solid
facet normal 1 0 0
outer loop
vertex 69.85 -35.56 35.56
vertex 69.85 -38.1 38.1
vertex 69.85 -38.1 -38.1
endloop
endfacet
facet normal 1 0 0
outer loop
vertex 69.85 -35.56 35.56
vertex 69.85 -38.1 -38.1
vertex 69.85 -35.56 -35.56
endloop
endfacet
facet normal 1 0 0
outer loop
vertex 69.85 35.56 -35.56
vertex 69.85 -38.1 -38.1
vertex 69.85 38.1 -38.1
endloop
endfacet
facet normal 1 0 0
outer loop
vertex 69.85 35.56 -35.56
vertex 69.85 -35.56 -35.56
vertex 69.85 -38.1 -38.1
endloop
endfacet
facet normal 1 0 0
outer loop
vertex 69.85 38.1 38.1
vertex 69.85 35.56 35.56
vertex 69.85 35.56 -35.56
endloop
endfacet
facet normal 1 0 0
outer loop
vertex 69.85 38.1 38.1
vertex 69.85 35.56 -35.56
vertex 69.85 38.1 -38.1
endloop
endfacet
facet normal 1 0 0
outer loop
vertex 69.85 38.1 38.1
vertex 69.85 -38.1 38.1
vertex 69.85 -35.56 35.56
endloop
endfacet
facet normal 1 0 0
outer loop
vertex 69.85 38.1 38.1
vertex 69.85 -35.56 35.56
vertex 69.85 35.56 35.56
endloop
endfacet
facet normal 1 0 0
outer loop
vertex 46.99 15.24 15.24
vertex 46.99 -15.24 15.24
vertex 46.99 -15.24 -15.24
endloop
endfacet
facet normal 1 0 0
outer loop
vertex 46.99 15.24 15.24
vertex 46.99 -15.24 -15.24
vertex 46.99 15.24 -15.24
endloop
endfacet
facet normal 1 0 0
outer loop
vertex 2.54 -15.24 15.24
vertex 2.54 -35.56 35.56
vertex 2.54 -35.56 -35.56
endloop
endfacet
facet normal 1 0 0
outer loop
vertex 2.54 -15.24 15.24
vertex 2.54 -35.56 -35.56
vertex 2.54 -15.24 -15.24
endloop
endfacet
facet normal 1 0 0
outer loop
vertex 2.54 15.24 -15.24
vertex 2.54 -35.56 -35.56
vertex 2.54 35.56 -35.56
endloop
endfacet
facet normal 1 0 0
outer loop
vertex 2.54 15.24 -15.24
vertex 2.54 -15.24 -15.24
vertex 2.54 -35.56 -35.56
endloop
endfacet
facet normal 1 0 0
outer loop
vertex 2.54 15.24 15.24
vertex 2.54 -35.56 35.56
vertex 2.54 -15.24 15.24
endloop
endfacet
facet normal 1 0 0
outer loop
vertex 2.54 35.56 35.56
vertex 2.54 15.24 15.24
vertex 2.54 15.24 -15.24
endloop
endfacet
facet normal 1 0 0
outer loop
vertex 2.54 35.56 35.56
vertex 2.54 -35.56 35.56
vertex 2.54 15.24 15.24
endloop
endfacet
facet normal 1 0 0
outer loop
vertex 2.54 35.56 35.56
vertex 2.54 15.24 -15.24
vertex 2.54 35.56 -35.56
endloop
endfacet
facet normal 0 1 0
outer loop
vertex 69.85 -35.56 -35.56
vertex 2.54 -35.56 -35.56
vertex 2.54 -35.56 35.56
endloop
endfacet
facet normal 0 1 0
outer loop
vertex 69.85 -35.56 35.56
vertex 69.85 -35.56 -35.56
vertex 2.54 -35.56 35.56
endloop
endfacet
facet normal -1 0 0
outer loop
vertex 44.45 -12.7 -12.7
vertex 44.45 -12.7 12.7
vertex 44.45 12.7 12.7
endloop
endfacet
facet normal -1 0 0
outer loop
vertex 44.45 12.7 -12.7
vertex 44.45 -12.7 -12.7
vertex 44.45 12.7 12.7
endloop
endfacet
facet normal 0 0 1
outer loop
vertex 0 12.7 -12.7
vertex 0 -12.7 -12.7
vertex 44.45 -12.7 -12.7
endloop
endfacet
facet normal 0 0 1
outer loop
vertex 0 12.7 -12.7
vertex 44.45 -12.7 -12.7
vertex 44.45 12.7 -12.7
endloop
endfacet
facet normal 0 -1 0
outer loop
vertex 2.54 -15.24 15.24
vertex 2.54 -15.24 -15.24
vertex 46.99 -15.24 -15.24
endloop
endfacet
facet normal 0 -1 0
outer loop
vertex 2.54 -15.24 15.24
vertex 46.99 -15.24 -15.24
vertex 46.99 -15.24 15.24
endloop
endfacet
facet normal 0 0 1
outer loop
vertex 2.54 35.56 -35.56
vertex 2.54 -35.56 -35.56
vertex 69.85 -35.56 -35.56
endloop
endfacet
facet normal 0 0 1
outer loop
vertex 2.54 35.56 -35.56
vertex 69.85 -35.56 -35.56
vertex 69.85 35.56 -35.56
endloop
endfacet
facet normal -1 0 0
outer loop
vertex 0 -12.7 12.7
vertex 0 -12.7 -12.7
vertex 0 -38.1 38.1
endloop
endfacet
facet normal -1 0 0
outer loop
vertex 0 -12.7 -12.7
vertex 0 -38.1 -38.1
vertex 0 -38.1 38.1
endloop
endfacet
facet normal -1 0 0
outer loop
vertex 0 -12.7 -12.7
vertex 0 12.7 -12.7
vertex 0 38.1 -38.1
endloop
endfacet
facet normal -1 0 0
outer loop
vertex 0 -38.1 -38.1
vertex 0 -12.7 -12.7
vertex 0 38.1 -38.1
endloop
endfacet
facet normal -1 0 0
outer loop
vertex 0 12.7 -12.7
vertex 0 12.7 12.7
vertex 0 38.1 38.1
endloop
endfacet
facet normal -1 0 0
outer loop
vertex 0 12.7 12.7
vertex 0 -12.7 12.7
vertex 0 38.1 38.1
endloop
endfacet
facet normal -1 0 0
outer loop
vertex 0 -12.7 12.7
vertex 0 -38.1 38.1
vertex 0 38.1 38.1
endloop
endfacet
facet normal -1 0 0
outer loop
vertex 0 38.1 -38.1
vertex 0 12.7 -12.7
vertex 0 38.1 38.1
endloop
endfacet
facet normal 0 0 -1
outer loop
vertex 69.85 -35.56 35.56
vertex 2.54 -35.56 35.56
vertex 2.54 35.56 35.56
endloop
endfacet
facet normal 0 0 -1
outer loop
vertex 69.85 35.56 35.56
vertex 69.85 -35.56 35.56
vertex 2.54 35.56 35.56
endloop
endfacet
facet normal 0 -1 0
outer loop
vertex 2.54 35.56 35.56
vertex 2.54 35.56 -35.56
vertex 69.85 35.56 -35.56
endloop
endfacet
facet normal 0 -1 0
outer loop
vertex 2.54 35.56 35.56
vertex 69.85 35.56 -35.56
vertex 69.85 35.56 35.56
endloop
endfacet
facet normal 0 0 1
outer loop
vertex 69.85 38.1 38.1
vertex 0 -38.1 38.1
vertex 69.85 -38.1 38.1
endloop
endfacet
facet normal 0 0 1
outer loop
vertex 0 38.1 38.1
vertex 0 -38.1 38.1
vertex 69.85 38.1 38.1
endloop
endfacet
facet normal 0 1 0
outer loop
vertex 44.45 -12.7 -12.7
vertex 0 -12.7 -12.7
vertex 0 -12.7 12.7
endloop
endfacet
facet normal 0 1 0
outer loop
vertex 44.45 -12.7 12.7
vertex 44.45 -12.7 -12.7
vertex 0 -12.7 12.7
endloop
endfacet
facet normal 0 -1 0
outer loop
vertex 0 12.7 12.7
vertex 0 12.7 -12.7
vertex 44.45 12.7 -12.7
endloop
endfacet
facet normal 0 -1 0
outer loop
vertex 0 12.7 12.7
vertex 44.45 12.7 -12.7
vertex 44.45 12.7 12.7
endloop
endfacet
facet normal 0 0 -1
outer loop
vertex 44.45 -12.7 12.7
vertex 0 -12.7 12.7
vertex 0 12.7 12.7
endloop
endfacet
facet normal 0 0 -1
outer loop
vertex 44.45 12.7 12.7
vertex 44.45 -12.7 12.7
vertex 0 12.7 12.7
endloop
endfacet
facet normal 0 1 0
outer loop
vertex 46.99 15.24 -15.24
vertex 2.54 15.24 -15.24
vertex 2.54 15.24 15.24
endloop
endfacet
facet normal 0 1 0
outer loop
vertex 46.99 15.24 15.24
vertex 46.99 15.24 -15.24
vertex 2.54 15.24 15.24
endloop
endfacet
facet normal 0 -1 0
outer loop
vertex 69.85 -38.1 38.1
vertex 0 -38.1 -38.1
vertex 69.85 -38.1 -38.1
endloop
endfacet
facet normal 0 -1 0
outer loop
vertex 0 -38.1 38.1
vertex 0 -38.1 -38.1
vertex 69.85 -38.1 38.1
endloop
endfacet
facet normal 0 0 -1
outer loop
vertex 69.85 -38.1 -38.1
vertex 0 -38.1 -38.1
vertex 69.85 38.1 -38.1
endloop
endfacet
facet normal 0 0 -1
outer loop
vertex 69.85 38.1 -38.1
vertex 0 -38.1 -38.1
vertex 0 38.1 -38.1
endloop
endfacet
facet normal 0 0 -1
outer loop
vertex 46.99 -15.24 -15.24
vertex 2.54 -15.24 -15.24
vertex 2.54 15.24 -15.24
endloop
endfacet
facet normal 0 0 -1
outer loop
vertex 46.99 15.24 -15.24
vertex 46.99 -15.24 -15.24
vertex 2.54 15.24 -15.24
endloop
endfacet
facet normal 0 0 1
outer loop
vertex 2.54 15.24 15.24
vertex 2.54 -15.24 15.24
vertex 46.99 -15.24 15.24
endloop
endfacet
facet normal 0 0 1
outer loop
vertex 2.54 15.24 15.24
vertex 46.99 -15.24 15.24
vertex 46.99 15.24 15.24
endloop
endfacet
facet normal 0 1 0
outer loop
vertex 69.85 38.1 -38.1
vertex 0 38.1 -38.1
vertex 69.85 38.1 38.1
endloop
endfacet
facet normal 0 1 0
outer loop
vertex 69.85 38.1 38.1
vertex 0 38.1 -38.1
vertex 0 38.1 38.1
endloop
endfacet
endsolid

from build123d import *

# Parameters (mm, degrees)
F0_W     = 76.2
F0_H     = 76.2
F1_DEPTH = 69.85
F2_T     = -25.4
F3_T     = -2.54


with BuildPart() as f1:
    # F0 (on Right) → F1 (new body)
    with BuildSketch(Plane.YZ):
        Rectangle(F0_W, F0_H)
    extrude(amount=F1_DEPTH)

    # F2
    f2_openings = [f1.faces().sort_by_distance(p)[0] for p in [
        (0, 0, 0),
    ]]
    offset(amount=F2_T, openings=f2_openings)

    # F3
    f3_openings = [f1.faces().sort_by_distance(p)[0] for p in [
        (69.85, 0, 0),
    ]]
    offset(amount=F3_T, openings=f3_openings, kind=Kind.INTERSECTION)


solid = f1.part
